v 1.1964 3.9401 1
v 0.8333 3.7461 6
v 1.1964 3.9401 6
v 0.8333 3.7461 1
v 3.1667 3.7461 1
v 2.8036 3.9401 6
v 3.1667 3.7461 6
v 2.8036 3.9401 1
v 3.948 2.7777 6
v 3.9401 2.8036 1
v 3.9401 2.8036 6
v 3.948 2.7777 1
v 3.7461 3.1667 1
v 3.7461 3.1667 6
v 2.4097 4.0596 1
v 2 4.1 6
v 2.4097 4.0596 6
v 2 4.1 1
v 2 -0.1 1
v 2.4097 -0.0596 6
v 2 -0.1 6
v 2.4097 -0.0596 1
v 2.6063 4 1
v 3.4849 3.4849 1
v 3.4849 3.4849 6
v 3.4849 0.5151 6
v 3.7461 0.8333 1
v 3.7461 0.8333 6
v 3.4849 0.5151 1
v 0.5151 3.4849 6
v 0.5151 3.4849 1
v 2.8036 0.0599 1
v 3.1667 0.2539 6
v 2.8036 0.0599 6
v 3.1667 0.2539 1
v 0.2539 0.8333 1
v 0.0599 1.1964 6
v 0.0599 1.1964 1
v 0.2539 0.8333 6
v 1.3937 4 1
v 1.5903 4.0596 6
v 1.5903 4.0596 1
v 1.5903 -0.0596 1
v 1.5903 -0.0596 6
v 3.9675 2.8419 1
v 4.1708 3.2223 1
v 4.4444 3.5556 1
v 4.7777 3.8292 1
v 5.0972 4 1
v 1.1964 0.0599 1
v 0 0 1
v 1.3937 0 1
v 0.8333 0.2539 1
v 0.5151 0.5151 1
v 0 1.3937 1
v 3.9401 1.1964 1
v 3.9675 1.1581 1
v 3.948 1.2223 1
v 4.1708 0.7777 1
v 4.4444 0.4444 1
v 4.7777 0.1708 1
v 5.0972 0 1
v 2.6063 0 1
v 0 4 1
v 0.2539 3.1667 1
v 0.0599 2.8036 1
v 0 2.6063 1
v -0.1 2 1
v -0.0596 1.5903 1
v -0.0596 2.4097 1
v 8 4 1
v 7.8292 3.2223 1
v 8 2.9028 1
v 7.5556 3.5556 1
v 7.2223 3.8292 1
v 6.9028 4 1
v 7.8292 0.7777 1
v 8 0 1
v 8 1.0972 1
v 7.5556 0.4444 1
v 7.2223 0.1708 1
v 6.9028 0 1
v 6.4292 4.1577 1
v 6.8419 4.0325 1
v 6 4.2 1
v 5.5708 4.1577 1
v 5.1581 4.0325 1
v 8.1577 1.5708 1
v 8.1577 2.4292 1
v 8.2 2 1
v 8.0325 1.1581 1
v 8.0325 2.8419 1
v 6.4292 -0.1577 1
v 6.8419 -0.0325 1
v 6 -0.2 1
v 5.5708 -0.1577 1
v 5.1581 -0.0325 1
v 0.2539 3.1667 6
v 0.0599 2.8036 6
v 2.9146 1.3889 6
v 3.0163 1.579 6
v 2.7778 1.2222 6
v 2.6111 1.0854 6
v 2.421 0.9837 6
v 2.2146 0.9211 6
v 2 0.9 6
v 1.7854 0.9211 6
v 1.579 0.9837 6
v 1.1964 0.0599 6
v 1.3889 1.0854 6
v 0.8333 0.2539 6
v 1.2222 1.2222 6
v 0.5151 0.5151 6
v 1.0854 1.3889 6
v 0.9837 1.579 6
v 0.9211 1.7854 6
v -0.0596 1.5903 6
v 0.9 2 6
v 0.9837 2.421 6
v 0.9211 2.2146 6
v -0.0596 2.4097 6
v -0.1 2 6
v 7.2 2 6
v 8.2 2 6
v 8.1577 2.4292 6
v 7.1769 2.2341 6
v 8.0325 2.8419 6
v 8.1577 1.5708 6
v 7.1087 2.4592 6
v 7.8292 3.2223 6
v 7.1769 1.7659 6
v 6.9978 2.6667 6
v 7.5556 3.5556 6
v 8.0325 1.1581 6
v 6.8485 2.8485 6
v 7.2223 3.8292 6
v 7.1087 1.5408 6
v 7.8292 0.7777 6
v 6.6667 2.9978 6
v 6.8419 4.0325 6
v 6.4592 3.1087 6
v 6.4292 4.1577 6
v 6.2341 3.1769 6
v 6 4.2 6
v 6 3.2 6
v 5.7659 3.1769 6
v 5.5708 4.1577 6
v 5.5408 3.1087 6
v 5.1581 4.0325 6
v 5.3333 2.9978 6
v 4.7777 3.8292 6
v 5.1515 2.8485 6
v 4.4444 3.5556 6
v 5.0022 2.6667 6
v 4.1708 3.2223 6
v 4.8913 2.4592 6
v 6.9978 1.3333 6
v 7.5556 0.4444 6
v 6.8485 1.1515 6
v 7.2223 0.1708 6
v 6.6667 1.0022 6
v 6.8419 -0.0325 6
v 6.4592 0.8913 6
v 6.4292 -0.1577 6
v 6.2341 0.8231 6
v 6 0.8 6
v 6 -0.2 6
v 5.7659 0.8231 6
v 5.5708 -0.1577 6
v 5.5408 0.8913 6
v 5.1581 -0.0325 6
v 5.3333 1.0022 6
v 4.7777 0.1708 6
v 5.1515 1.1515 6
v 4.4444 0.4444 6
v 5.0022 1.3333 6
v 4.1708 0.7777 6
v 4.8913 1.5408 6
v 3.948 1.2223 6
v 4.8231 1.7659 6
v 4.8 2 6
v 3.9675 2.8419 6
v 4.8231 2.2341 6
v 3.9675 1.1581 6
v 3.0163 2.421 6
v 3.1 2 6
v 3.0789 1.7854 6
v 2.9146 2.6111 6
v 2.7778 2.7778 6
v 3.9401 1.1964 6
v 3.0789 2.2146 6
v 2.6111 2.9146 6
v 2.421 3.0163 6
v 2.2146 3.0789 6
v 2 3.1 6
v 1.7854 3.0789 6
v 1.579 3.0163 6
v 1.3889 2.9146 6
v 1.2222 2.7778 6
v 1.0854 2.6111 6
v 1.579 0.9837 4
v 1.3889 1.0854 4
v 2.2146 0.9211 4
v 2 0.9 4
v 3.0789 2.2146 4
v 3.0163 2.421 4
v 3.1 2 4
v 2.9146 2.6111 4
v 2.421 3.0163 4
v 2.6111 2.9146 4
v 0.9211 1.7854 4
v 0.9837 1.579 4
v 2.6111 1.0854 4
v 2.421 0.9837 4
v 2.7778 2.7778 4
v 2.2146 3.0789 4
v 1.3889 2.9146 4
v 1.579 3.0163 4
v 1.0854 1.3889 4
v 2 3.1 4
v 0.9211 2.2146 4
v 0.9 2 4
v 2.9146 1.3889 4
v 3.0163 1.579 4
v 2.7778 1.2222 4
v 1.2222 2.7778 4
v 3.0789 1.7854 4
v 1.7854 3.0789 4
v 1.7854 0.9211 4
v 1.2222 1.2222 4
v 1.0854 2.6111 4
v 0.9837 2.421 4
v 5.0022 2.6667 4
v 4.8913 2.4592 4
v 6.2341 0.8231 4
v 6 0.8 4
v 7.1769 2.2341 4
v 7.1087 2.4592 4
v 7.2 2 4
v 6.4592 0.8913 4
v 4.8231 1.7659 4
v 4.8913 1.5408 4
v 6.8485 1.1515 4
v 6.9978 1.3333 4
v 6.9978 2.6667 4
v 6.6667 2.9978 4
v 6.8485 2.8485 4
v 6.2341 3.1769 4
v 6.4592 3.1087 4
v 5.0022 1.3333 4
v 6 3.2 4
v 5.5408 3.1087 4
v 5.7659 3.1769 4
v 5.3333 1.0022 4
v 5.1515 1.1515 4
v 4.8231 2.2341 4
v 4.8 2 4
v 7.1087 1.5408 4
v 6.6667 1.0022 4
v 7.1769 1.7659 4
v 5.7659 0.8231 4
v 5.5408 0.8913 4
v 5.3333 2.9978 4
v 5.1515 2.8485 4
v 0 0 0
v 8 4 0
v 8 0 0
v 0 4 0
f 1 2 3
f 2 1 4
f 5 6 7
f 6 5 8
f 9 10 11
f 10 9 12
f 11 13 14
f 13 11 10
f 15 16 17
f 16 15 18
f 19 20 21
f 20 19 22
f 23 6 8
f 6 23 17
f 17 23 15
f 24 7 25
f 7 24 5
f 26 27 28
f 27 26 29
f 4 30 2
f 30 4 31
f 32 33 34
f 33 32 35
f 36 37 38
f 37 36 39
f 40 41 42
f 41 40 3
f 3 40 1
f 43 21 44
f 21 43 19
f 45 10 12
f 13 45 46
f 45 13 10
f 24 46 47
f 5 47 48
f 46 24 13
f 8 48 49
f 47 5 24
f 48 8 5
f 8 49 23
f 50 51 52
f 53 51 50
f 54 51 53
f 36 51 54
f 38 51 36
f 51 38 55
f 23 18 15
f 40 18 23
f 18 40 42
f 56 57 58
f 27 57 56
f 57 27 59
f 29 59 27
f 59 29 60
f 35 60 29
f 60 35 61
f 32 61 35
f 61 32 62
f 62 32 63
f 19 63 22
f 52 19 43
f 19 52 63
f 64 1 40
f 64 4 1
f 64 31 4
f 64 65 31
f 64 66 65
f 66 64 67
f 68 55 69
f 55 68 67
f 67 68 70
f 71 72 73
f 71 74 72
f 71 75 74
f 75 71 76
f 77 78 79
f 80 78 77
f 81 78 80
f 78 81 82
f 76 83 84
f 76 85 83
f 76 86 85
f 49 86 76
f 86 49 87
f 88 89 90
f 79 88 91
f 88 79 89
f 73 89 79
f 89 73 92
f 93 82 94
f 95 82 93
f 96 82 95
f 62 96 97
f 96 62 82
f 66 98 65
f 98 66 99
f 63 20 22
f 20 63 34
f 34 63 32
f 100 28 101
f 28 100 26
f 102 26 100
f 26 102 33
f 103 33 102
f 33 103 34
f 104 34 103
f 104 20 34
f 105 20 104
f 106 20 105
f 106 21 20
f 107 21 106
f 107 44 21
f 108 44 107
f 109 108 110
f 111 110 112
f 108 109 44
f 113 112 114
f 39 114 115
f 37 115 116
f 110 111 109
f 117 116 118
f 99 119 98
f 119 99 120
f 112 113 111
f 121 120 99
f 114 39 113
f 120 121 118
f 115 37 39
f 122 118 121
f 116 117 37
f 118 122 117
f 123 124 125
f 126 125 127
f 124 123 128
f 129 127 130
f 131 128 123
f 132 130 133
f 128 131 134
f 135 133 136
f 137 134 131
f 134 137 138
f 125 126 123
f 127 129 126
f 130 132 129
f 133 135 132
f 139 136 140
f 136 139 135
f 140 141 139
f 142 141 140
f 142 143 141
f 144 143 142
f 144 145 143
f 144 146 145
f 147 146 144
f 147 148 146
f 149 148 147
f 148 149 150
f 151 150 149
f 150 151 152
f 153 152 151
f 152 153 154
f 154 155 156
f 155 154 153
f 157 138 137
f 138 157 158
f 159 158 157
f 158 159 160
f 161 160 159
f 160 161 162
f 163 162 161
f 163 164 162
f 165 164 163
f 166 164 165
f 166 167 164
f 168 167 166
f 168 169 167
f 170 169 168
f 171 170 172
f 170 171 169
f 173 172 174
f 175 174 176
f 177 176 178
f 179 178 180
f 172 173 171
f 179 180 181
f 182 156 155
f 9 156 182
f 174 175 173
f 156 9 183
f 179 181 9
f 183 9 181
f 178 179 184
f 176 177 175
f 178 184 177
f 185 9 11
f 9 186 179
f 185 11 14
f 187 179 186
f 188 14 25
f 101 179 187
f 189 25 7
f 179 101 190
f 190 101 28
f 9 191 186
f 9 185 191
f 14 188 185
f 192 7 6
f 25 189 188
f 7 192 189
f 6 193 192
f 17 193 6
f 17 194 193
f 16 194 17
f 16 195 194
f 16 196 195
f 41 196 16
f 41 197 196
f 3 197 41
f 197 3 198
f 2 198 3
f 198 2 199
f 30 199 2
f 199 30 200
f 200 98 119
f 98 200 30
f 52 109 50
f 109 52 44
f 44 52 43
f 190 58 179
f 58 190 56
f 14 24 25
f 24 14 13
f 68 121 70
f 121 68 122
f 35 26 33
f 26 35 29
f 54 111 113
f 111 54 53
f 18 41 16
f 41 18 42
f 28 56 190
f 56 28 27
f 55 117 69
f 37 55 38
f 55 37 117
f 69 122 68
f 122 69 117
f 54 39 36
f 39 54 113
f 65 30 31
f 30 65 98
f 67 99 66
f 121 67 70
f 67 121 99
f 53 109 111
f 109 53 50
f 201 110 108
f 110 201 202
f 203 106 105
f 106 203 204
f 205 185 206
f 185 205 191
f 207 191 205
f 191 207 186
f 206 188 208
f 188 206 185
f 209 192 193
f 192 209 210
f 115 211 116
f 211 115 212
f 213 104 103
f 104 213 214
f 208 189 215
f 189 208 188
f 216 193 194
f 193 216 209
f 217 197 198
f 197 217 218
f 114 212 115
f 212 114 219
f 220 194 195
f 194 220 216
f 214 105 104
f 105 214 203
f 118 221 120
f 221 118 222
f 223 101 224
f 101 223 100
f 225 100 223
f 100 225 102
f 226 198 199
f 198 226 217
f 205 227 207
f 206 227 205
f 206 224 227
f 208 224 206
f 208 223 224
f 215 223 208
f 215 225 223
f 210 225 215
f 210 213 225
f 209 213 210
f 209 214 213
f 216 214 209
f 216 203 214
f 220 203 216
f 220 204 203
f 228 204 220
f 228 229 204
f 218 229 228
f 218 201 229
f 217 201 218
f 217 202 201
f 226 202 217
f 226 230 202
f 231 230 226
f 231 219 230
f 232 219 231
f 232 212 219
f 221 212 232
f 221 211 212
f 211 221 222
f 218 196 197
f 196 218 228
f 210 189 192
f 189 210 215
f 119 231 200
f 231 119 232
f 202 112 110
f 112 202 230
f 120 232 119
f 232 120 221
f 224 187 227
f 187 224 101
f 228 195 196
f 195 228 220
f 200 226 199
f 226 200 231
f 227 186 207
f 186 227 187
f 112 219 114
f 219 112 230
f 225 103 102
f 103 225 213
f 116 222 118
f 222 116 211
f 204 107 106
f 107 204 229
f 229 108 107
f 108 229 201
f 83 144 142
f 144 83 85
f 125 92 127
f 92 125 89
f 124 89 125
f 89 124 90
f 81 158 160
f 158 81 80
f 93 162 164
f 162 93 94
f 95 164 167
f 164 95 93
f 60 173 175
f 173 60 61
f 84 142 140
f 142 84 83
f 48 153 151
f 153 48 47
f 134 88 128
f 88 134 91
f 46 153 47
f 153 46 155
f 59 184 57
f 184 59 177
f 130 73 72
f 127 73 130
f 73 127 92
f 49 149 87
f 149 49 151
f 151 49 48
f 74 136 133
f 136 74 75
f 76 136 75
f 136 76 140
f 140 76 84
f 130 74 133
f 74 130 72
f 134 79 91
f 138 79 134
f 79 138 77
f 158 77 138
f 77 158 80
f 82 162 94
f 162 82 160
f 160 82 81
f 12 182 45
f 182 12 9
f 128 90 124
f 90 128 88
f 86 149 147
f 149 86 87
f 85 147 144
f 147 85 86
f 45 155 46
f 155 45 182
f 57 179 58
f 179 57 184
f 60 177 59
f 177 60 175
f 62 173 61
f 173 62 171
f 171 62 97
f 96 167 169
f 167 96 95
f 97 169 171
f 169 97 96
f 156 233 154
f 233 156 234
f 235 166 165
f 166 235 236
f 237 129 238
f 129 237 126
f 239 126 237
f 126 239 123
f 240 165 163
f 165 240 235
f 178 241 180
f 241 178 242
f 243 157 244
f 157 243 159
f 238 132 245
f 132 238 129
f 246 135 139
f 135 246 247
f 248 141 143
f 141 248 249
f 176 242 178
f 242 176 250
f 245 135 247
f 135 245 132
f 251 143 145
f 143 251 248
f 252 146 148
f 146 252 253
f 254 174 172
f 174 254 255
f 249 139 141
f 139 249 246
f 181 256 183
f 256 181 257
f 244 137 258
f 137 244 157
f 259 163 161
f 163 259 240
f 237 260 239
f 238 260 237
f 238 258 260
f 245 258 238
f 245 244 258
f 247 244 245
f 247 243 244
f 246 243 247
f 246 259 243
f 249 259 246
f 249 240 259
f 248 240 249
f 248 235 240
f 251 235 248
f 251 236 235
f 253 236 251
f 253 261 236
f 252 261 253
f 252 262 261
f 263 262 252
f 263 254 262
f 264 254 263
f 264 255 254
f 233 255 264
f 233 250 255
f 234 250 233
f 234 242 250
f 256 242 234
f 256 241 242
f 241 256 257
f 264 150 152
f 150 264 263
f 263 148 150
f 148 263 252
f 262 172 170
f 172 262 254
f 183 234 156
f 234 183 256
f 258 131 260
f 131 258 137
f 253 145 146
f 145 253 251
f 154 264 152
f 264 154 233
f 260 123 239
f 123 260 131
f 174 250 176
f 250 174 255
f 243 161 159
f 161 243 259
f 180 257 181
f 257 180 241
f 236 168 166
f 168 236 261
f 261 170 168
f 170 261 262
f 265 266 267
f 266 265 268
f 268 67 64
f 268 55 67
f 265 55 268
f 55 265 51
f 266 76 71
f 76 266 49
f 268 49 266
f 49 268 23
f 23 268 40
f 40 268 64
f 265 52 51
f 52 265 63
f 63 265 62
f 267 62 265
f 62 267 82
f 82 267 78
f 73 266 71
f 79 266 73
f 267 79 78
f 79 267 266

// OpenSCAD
// file: generic.scad
module myBox(w,d,h) 
{
    translate([-1,-1,-1])
    difference() {
        cube([w+2, d+2, h+1]);
        translate([1, 1, 1])
            cube([w, d, h]);
    }
}

module stud(radius, h)
{    
    union() {
        cylinder(h, radius + 0.7, radius+0.7);
        translate([0,0, h])
        cylinder(3, radius, radius);
        translate ([-4, -0.5, 0]) cube([8, 1, h - 8]);
        translate ([-0.5, -4, 0]) cube([1, 8, h - 8]);
    }
}

module studHole(radius, h)
{    
    difference() {
        cylinder(h, radius + 1, radius+1);
        translate([0,0,h-2])
        cylinder(2, radius, radius);
    }    
}
// main file
$fn=32;

use <generic.scad>
*translate([-4,-4-0]) cube([4,4,1]);
*translate([-2, -2, 1]) stud(1, 2);

translate([0,0,0]) cube([4,4,1]);
translate([2,2,1]) studHole(1.1, 5);

translate([4,0,0]) cube([4,4,1]);
translate([6,2,1]) studHole(1.2, 5);
